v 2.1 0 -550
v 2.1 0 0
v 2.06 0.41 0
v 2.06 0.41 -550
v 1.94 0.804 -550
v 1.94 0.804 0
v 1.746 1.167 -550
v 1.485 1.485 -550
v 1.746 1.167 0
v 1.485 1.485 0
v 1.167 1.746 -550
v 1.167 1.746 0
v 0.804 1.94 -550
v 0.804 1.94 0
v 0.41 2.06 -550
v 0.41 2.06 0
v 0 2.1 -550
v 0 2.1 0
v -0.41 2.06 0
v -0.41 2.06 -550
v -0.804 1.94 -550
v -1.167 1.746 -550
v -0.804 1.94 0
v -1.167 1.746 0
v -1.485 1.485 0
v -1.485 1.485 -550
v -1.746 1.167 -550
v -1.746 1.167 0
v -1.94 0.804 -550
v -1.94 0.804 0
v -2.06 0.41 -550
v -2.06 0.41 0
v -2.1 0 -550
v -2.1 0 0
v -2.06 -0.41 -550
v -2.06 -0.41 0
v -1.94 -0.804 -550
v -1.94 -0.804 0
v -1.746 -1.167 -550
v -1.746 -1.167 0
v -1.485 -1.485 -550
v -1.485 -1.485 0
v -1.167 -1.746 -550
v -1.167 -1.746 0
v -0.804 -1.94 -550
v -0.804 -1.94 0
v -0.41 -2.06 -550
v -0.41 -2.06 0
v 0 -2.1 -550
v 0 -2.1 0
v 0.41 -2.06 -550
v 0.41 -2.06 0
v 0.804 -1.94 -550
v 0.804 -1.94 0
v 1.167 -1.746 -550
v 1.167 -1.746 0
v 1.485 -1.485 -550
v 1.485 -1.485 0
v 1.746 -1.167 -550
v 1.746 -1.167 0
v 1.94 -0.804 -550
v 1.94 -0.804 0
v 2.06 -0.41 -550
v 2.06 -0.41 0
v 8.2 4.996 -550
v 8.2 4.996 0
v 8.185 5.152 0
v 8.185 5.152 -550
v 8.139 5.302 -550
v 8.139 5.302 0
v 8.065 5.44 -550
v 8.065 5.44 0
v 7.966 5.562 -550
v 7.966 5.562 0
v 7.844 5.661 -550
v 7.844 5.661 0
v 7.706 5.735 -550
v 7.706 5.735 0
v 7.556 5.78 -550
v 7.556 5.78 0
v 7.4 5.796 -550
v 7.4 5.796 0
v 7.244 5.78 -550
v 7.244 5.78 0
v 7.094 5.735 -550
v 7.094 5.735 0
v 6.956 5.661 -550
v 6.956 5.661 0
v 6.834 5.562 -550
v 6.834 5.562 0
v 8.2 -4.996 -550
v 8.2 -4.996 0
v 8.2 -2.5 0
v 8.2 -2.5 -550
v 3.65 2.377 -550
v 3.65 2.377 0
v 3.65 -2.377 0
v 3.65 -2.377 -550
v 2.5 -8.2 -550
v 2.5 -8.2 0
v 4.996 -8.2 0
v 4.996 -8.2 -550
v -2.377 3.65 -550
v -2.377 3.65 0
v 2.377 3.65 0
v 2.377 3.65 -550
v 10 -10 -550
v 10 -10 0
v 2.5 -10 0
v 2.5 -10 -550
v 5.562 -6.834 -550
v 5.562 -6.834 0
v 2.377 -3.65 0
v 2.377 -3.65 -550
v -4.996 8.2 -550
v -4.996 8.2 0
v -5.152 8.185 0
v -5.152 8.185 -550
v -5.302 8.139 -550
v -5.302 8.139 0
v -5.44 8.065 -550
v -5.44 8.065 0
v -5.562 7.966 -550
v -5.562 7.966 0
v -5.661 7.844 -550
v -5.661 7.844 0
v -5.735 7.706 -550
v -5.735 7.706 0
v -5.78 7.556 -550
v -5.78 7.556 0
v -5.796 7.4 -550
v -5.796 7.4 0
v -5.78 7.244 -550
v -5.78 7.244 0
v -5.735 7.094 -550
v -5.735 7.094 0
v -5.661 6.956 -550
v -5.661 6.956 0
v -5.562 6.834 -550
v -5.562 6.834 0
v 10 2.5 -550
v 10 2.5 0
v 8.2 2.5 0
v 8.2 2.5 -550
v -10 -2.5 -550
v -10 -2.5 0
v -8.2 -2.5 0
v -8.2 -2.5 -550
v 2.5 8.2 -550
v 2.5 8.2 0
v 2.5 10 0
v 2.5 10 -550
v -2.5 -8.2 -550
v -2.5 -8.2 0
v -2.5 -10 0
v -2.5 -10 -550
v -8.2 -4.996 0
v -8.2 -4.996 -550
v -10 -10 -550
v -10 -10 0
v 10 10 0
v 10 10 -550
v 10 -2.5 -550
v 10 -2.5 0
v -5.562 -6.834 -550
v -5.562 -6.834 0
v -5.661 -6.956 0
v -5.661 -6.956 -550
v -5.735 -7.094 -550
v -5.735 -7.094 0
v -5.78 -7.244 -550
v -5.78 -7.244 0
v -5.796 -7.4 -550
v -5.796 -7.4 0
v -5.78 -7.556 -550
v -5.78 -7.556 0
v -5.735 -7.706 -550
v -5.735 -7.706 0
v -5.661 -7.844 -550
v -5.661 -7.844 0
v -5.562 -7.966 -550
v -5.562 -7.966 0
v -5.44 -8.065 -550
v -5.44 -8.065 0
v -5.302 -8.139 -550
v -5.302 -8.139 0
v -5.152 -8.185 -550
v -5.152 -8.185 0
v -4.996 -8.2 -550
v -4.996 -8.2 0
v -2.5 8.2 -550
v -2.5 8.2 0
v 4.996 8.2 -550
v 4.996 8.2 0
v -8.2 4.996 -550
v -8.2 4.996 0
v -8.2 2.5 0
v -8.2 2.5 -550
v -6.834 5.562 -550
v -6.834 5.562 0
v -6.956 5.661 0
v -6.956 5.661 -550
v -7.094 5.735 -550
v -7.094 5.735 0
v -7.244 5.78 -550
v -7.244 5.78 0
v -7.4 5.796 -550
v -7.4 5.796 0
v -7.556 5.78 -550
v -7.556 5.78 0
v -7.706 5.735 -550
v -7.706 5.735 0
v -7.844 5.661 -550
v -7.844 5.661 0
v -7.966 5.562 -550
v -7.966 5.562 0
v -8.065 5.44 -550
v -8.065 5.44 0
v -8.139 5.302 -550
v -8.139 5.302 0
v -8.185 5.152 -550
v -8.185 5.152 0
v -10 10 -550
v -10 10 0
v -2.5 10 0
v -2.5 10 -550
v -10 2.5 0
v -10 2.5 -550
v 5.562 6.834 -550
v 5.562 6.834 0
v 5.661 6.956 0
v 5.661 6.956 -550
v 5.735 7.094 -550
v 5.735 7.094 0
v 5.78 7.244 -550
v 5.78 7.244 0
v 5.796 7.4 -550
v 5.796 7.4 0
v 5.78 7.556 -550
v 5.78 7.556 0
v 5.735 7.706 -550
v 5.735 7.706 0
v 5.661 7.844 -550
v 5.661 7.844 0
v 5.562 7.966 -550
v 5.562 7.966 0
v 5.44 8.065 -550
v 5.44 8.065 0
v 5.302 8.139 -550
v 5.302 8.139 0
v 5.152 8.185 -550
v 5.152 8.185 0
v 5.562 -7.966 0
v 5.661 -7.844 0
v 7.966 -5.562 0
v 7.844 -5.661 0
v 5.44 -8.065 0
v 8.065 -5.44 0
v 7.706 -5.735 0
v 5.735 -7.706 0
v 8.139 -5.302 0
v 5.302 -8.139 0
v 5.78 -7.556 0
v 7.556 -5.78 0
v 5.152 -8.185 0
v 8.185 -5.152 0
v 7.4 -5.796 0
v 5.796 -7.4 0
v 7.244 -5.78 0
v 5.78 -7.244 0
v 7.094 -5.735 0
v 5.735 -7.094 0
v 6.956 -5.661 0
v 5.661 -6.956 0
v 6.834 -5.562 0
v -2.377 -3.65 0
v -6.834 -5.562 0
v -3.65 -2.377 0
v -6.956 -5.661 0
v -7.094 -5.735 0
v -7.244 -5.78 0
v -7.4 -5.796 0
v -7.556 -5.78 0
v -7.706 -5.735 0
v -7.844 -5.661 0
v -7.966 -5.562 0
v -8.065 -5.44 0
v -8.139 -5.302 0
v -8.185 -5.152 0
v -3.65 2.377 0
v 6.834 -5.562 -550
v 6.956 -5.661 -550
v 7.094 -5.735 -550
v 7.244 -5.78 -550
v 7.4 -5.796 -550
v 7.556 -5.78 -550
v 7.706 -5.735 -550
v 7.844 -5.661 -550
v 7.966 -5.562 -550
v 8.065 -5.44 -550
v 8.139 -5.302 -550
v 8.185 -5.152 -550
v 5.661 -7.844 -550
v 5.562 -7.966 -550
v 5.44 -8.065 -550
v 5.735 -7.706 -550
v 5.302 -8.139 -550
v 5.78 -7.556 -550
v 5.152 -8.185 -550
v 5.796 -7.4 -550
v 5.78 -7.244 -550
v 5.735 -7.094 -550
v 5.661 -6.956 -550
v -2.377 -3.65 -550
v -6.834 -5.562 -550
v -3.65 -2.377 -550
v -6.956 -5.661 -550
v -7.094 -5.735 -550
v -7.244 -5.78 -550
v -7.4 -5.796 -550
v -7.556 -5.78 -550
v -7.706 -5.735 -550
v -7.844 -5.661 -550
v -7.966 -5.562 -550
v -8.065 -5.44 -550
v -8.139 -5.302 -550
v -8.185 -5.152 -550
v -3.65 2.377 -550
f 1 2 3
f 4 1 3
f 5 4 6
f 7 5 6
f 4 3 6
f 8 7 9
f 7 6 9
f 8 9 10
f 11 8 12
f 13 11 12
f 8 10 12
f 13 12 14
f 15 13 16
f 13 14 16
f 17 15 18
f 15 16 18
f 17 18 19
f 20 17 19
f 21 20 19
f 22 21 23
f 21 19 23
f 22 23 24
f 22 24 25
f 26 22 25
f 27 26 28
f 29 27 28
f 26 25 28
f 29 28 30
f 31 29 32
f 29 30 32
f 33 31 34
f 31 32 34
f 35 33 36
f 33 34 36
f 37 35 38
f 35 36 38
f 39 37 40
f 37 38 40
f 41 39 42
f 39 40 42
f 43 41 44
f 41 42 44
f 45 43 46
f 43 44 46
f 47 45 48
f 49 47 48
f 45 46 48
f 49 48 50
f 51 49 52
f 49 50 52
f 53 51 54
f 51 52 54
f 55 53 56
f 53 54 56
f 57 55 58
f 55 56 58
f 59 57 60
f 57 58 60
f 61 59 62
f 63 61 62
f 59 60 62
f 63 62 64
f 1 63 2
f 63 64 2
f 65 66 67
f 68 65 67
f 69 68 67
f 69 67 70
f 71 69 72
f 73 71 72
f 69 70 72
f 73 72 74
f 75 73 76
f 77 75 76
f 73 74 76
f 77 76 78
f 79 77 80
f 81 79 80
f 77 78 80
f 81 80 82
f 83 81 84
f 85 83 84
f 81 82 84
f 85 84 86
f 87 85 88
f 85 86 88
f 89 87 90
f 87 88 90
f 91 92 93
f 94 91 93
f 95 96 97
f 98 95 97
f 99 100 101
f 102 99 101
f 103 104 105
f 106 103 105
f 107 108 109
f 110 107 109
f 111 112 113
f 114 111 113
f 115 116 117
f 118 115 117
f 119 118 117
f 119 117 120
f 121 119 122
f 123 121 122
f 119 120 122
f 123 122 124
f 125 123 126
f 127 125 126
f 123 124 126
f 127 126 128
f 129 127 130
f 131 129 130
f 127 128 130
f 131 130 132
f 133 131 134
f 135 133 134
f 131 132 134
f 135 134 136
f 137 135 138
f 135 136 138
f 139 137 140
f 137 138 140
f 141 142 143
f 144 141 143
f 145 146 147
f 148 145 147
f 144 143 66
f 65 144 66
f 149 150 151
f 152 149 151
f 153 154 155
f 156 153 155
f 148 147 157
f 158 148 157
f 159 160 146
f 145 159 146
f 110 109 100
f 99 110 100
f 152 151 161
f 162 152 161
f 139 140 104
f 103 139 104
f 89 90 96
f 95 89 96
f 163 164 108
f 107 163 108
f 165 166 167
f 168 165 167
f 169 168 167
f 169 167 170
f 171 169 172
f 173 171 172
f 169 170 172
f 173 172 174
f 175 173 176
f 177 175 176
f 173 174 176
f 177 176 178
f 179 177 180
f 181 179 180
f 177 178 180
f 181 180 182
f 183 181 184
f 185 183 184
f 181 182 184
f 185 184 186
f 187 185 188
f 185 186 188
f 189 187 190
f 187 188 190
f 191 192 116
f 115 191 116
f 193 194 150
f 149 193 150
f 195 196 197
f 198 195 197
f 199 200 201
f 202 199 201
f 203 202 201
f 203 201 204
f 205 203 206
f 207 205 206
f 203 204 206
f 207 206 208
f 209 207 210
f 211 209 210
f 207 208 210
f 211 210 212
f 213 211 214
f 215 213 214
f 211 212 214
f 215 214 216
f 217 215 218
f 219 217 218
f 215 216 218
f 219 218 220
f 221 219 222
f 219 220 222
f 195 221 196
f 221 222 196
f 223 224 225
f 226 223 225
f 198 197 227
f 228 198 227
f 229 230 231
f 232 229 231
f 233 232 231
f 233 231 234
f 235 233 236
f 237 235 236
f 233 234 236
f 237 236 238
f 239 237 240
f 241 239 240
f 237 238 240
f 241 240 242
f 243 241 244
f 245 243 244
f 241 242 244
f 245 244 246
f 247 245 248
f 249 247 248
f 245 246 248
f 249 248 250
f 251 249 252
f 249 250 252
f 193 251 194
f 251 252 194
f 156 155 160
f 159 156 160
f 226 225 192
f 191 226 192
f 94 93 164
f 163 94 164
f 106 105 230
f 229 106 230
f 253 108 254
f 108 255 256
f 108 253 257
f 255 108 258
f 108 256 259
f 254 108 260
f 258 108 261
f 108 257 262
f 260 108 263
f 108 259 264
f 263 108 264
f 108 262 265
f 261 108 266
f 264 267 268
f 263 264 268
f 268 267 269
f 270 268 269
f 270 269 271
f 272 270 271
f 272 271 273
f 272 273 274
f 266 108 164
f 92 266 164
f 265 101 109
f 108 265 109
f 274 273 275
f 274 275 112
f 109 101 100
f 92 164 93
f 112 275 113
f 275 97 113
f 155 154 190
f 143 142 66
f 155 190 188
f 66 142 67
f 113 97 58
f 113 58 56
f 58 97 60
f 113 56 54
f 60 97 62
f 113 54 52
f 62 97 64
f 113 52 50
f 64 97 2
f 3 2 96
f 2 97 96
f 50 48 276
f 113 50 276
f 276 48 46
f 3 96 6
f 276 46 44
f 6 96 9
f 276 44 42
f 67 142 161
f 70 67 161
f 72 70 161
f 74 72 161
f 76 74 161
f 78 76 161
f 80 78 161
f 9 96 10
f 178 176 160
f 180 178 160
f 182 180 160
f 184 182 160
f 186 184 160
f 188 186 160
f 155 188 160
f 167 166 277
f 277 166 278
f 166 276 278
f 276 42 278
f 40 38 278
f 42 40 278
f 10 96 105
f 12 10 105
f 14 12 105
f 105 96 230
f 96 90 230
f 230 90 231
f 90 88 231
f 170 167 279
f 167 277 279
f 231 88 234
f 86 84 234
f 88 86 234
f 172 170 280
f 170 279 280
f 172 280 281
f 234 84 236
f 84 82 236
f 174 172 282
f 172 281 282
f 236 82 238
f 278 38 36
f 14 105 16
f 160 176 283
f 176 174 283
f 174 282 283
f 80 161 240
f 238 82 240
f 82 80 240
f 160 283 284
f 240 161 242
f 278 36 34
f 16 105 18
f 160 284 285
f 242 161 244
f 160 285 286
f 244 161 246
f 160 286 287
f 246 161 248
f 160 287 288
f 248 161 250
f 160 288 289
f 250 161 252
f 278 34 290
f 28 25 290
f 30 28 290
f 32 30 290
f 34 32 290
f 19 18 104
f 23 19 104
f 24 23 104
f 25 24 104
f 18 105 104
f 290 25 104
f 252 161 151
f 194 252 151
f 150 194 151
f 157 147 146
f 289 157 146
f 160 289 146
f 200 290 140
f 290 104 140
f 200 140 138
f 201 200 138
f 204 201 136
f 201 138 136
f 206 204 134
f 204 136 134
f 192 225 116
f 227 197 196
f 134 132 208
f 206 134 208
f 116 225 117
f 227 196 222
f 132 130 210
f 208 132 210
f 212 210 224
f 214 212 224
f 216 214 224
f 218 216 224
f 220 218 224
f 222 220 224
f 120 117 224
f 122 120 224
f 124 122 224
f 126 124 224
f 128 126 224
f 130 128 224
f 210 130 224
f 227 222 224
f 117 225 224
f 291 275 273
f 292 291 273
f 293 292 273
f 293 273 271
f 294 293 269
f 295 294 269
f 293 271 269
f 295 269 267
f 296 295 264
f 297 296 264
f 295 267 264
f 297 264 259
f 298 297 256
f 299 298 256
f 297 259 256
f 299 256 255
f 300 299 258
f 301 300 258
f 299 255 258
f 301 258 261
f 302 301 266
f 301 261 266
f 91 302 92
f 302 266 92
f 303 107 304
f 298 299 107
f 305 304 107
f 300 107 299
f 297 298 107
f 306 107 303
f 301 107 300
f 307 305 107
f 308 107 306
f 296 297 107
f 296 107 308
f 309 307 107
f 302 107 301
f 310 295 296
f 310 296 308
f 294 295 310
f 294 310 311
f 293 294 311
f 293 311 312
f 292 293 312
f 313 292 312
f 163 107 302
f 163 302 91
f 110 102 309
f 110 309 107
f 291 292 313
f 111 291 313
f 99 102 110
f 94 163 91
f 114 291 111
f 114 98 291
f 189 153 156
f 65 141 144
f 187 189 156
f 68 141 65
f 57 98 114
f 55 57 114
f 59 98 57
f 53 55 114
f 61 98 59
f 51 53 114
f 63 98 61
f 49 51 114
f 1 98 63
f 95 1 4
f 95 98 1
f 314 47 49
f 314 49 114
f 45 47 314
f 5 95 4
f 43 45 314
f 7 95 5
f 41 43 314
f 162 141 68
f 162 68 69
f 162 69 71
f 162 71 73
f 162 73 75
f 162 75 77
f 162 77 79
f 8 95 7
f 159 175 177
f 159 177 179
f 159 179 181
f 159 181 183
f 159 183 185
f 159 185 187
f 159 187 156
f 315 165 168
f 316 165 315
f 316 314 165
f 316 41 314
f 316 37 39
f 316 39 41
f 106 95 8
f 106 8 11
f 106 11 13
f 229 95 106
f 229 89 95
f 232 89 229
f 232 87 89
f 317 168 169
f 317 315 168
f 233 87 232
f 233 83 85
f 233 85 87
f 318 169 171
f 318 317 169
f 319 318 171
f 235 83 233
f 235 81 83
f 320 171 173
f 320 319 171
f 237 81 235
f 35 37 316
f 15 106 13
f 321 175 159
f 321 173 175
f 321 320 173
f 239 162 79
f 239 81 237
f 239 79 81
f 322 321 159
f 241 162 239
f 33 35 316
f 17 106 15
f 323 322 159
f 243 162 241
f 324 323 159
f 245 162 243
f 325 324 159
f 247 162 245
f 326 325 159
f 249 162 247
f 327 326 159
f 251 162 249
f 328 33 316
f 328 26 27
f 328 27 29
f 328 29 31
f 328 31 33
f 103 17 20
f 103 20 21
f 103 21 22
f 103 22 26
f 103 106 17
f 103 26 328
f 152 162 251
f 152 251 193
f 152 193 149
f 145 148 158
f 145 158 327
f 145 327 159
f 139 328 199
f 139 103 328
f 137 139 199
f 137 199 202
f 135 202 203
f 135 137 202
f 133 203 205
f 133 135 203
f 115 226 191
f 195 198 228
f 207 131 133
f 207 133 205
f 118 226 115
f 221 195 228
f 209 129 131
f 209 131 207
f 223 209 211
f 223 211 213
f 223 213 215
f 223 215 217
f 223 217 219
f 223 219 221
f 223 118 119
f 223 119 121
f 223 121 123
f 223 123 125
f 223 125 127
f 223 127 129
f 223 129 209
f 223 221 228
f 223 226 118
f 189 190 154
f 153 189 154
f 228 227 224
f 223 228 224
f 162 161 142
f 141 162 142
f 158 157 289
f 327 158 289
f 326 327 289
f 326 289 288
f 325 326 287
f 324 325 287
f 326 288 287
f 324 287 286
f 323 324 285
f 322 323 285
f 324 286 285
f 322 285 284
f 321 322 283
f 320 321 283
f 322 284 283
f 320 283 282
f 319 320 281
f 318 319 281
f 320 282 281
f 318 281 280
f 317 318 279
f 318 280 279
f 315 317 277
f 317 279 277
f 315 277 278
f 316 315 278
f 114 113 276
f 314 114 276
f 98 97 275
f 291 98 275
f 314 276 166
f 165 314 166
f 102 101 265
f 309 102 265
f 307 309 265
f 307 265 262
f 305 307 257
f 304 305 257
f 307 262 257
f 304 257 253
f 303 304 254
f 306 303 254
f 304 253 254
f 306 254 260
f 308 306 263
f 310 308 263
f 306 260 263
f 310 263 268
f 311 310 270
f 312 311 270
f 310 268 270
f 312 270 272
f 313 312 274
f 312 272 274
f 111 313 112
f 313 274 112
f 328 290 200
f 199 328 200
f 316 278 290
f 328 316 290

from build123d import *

# Parameters (mm, degrees)
CROQUIS15_R             = 2.1
SALIENTE_EXTRUIR2_DEPTH = 550


with BuildPart() as part:
    # Croquis15 → Saliente-Extruir2 (new body)
    with BuildSketch(Plane.XY):
        with BuildLine():
            Line((-10, -10), (-10, -2.5))
            Line((-10, -2.5), (-8.2, -2.5))
            Line((-8.2, -2.5), (-8.2, -4.995836944))
            ThreePointArc((-8.2, -4.995836944), (-7.706146746, -5.73494057), (-6.834314575, -5.561522369))
            Line((-6.834314575, -5.561522369), (-3.65, -2.377207794))
            Line((-3.65, -2.377207794), (-3.65, 2.377207794))
            Line((-3.65, 2.377207794), (-6.834314575, 5.561522369))
            ThreePointArc((-6.834314575, 5.561522369), (-7.706146746, 5.73494057), (-8.2, 4.995836944))
            Line((-8.2, 4.995836944), (-8.2, 2.5))
            Line((-8.2, 2.5), (-10, 2.5))
            Line((-10, 2.5), (-10, 10))
            Line((-10, 10), (-2.5, 10))
            Line((-2.5, 10), (-2.5, 8.2))
            Line((-2.5, 8.2), (-4.995836944, 8.2))
            ThreePointArc((-4.995836944, 8.2), (-5.73494057, 7.706146746), (-5.561522369, 6.834314575))
            Line((-5.561522369, 6.834314575), (-2.377207794, 3.65))
            Line((-2.377207794, 3.65), (2.377207794, 3.65))
            Line((2.377207794, 3.65), (5.561522369, 6.834314575))
            ThreePointArc((5.561522369, 6.834314575), (5.73494057, 7.706146746), (4.995836944, 8.2))
            Line((4.995836944, 8.2), (2.5, 8.2))
            Line((2.5, 8.2), (2.5, 10))
            Line((2.5, 10), (10, 10))
            Line((10, 10), (10, 2.5))
            Line((10, 2.5), (8.2, 2.5))
            Line((8.2, 2.5), (8.2, 4.995836944))
            ThreePointArc((8.2, 4.995836944), (7.706146746, 5.73494057), (6.834314575, 5.561522369))
            Line((6.834314575, 5.561522369), (3.65, 2.377207794))
            Line((3.65, 2.377207794), (3.65, -2.377207794))
            Line((3.65, -2.377207794), (6.834314575, -5.561522369))
            ThreePointArc((6.834314575, -5.561522369), (7.706146746, -5.73494057), (8.2, -4.995836944))
            Line((8.2, -4.995836944), (8.2, -2.5))
            Line((8.2, -2.5), (10, -2.5))
            Line((10, -2.5), (10, -10))
            Line((10, -10), (2.5, -10))
            Line((2.5, -10), (2.5, -8.2))
            Line((2.5, -8.2), (4.995836944, -8.2))
            ThreePointArc((4.995836944, -8.2), (5.73494057, -7.706146746), (5.561522369, -6.834314575))
            Line((5.561522369, -6.834314575), (2.377207794, -3.65))
            Line((2.377207794, -3.65), (-2.377207794, -3.65))
            Line((-2.377207794, -3.65), (-5.561522369, -6.834314575))
            ThreePointArc((-5.561522369, -6.834314575), (-5.73494057, -7.706146746), (-4.995836944, -8.2))
            Line((-4.995836944, -8.2), (-2.5, -8.2))
            Line((-2.5, -8.2), (-2.5, -10))
            Line((-2.5, -10), (-10, -10))
        make_face()
        Circle(CROQUIS15_R, mode=Mode.SUBTRACT)
    extrude(amount=-SALIENTE_EXTRUIR2_DEPTH)


solid = part.part
